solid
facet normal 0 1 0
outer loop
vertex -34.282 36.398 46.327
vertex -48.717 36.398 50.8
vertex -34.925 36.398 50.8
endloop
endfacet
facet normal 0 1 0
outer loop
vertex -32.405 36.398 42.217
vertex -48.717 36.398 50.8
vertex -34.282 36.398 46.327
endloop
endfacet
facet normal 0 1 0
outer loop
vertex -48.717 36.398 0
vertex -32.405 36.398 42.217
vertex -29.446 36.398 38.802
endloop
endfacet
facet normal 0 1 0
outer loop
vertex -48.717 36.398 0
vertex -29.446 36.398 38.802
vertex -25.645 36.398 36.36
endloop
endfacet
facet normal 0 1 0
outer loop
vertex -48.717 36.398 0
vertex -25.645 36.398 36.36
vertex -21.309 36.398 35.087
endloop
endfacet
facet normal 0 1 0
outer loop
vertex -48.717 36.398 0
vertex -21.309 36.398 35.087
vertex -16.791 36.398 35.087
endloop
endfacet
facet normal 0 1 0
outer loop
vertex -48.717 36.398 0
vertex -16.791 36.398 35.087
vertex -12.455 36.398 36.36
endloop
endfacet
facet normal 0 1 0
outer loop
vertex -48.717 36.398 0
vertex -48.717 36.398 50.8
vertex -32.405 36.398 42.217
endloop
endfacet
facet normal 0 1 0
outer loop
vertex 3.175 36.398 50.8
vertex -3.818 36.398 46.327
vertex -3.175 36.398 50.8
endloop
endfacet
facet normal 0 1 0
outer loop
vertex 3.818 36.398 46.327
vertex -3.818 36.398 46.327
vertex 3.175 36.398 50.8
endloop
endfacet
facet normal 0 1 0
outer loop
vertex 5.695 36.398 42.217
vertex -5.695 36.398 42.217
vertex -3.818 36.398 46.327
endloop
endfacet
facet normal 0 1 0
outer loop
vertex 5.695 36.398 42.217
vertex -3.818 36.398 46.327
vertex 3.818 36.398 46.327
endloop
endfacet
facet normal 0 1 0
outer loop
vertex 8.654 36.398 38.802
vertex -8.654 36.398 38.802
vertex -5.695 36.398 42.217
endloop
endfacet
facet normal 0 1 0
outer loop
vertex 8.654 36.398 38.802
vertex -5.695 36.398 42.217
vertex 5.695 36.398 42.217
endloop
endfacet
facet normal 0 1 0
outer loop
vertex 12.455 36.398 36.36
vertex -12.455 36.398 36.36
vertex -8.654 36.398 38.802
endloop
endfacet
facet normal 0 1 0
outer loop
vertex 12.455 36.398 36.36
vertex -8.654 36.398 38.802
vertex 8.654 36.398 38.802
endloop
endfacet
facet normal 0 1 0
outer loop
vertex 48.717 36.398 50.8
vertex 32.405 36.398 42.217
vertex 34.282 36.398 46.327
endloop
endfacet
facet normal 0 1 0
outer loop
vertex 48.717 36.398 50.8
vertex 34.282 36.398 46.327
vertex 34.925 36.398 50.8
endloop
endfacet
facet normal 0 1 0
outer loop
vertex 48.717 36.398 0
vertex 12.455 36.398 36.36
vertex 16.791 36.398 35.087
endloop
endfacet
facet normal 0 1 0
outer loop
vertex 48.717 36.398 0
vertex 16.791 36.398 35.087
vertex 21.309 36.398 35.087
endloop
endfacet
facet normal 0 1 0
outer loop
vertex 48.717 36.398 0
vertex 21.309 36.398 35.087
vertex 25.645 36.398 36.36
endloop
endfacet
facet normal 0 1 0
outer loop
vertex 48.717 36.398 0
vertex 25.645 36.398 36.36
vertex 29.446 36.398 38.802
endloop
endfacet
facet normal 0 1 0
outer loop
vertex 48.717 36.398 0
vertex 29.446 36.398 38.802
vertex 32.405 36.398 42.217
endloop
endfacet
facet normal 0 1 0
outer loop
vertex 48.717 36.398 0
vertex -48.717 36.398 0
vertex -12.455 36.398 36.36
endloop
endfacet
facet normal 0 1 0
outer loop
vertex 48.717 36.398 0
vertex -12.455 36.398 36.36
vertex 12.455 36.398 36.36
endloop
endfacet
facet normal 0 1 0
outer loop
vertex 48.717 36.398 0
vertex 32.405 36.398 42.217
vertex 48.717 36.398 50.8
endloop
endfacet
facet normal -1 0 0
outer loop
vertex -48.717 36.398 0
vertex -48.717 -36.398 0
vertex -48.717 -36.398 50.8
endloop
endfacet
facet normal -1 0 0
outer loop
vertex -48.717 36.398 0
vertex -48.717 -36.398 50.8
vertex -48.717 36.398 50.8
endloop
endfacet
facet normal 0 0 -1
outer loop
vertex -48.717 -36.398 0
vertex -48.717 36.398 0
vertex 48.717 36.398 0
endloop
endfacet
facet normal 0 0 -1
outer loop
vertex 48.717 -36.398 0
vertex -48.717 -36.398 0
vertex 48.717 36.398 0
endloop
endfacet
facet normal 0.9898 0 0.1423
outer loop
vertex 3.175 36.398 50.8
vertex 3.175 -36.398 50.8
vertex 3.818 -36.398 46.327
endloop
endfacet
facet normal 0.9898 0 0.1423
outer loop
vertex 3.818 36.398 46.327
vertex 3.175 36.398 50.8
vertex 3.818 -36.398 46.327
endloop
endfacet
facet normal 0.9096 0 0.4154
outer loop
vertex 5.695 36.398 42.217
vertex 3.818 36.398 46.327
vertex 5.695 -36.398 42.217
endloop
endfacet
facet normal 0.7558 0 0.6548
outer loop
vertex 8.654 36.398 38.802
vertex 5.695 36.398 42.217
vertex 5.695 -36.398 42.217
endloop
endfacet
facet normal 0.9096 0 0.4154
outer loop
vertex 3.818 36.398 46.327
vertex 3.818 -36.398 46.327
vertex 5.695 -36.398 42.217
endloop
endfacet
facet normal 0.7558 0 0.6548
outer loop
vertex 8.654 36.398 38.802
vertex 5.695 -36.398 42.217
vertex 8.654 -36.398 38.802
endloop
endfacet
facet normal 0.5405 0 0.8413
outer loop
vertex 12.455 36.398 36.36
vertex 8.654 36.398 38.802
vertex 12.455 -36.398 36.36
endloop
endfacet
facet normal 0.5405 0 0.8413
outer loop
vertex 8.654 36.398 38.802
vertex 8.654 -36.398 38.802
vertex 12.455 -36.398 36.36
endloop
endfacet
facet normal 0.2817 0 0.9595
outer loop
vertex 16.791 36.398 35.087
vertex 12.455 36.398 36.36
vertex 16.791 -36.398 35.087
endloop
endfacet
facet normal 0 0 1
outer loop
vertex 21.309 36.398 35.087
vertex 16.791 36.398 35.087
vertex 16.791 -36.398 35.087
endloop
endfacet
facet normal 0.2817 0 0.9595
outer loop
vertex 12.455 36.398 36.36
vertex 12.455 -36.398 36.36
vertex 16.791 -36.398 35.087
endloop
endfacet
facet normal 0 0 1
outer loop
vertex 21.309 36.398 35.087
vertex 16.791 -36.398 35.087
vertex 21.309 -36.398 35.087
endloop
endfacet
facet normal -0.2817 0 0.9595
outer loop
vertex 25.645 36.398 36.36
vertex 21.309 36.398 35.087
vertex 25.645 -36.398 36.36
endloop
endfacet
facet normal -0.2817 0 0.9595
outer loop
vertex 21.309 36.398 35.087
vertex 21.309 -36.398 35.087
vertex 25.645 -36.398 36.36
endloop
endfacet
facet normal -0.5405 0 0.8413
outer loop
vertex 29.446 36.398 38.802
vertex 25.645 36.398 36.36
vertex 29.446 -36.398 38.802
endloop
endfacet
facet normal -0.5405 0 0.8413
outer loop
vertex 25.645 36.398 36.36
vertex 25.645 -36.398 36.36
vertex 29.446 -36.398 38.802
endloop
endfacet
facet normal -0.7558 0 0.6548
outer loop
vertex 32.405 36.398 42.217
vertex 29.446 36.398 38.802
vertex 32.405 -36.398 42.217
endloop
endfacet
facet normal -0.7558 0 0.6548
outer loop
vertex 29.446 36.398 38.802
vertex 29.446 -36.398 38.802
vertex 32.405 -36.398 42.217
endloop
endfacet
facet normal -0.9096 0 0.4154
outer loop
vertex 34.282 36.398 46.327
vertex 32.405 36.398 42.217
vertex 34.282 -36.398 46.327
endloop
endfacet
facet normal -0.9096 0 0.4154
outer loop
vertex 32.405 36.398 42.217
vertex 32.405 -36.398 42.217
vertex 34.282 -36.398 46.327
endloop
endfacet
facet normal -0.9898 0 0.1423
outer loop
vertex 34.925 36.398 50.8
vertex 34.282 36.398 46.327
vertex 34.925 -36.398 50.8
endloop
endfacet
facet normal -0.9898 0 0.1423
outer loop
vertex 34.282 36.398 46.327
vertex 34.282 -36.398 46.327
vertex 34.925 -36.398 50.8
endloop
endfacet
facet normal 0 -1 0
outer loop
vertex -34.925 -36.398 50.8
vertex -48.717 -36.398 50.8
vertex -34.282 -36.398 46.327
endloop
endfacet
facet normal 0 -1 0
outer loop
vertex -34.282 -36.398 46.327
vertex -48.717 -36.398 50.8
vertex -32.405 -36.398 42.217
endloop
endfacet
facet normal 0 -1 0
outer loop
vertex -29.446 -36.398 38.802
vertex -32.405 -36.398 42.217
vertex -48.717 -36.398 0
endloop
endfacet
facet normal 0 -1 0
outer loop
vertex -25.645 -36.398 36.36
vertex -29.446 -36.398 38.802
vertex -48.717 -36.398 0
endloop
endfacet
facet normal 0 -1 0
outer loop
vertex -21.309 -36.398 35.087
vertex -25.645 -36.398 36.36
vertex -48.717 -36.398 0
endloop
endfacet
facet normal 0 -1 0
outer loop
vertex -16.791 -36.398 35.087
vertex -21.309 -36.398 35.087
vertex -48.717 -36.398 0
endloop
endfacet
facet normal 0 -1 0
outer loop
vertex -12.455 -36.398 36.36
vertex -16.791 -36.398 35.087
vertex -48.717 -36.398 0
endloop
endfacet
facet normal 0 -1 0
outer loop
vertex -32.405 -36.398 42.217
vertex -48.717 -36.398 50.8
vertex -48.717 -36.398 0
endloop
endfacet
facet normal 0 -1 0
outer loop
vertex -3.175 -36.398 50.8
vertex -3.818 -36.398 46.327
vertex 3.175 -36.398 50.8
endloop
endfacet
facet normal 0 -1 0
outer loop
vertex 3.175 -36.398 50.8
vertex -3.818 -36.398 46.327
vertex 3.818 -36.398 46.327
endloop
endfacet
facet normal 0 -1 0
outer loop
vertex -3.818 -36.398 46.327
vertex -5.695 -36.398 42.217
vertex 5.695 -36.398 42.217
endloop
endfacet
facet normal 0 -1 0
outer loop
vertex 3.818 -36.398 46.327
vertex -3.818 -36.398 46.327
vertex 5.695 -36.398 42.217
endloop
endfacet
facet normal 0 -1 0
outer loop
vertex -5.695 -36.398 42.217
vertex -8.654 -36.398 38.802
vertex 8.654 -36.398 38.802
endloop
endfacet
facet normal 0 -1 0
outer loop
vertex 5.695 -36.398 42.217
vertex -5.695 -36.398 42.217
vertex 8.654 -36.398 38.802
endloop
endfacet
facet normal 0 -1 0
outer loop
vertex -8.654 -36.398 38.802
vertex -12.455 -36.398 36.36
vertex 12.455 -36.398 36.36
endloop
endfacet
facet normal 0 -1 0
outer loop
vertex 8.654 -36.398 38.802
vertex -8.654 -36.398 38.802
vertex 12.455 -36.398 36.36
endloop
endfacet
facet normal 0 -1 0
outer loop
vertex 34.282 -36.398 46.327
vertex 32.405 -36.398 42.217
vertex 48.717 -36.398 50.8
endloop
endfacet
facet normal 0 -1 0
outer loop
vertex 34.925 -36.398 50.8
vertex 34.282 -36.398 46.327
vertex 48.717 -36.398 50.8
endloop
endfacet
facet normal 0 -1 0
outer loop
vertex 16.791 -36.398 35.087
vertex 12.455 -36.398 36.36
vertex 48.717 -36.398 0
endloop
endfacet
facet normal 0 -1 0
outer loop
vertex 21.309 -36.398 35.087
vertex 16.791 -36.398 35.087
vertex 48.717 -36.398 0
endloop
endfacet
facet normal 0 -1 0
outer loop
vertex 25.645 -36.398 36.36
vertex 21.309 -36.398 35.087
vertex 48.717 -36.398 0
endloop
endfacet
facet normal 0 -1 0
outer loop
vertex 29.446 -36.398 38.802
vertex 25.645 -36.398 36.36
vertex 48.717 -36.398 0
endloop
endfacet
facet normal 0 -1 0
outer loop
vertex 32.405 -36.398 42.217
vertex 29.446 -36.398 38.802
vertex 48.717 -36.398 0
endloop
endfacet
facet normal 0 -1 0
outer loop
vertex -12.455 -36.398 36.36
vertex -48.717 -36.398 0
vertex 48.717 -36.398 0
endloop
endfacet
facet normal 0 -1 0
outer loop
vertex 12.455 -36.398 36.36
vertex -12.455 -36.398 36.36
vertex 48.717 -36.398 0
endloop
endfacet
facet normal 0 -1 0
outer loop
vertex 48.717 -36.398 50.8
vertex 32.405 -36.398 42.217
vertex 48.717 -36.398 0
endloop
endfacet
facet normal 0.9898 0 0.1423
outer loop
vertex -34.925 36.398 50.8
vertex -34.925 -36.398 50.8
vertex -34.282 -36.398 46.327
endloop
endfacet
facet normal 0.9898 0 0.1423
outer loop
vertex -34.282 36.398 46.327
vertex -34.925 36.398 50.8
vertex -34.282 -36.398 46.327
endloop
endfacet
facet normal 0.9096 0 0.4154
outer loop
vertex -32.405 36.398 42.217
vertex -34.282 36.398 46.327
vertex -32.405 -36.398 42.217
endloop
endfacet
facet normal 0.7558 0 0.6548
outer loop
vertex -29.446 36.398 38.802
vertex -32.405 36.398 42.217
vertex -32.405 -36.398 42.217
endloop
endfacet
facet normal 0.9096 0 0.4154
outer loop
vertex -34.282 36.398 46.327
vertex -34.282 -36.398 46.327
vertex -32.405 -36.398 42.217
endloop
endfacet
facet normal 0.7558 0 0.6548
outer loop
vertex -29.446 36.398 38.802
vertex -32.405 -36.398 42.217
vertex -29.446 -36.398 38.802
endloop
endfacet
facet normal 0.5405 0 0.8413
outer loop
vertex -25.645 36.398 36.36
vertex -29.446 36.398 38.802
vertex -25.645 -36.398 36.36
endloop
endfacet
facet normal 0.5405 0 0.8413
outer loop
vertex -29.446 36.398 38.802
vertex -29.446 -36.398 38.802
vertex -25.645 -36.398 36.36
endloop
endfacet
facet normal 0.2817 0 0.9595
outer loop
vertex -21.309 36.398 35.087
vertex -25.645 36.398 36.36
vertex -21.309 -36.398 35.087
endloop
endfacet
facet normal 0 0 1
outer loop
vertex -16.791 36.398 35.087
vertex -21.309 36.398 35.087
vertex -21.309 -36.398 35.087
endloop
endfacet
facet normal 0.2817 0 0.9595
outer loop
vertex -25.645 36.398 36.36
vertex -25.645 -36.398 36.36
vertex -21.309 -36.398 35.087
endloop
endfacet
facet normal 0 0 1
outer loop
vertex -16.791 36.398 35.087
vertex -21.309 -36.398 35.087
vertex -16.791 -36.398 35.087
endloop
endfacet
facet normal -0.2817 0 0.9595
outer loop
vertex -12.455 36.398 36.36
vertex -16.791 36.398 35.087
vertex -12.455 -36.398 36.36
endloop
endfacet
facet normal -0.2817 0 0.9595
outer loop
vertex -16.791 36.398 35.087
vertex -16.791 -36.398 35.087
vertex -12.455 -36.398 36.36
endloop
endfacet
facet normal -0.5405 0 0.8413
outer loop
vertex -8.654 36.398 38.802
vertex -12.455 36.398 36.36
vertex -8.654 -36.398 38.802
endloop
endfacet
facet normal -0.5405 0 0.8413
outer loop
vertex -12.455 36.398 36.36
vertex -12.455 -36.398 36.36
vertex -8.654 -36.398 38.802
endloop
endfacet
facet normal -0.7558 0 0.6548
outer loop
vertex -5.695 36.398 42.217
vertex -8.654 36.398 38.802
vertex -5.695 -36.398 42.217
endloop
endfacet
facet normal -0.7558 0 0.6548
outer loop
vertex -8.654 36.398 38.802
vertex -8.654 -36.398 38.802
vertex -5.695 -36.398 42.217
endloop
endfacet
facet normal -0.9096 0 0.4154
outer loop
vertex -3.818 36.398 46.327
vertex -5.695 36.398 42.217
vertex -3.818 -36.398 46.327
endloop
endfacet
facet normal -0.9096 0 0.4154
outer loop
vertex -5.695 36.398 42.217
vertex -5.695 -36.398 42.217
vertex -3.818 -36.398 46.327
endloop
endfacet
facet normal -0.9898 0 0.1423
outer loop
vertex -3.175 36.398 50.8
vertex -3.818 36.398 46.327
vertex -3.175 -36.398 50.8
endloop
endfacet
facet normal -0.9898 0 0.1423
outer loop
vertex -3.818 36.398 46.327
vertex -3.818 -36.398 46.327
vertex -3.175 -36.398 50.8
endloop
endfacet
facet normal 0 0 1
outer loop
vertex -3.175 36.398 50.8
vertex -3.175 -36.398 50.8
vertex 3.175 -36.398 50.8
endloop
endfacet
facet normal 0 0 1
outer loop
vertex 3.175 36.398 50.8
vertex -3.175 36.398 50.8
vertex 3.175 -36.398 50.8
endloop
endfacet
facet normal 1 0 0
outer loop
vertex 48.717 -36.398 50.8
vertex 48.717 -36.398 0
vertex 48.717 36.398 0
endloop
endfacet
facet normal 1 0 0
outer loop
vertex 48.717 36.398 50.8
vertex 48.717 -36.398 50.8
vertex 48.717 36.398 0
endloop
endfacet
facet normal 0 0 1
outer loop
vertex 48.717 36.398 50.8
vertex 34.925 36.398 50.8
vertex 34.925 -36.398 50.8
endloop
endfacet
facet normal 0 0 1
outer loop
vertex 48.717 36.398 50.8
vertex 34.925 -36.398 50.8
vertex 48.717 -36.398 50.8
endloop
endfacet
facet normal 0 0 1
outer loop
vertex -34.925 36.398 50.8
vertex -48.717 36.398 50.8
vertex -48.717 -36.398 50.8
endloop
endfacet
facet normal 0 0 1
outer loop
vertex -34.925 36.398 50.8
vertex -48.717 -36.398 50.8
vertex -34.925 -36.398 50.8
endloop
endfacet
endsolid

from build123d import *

# Parameters (mm, degrees)
F0_W     = 97.43362
F0_H     = 72.795242
F1_DEPTH = 50.8
F2_R     = 15.875
F3_DEPTH = 72.796242


with BuildPart() as f1:
    # F0 (on Top) → F1 (new body)
    with BuildSketch(Plane.XY):
        Rectangle(F0_W, F0_H)
    extrude(amount=F1_DEPTH)

    # F2 (on face) → F3 (cut, through all)
    with BuildSketch(Plane.XZ.offset(36.397621)):
        with Locations((-19.05, 50.8)):
            Circle(F2_R)
        with Locations((19.05, 50.8)):
            Circle(F2_R)
    extrude(amount=-F3_DEPTH, mode=Mode.SUBTRACT)


solid = f1.part
